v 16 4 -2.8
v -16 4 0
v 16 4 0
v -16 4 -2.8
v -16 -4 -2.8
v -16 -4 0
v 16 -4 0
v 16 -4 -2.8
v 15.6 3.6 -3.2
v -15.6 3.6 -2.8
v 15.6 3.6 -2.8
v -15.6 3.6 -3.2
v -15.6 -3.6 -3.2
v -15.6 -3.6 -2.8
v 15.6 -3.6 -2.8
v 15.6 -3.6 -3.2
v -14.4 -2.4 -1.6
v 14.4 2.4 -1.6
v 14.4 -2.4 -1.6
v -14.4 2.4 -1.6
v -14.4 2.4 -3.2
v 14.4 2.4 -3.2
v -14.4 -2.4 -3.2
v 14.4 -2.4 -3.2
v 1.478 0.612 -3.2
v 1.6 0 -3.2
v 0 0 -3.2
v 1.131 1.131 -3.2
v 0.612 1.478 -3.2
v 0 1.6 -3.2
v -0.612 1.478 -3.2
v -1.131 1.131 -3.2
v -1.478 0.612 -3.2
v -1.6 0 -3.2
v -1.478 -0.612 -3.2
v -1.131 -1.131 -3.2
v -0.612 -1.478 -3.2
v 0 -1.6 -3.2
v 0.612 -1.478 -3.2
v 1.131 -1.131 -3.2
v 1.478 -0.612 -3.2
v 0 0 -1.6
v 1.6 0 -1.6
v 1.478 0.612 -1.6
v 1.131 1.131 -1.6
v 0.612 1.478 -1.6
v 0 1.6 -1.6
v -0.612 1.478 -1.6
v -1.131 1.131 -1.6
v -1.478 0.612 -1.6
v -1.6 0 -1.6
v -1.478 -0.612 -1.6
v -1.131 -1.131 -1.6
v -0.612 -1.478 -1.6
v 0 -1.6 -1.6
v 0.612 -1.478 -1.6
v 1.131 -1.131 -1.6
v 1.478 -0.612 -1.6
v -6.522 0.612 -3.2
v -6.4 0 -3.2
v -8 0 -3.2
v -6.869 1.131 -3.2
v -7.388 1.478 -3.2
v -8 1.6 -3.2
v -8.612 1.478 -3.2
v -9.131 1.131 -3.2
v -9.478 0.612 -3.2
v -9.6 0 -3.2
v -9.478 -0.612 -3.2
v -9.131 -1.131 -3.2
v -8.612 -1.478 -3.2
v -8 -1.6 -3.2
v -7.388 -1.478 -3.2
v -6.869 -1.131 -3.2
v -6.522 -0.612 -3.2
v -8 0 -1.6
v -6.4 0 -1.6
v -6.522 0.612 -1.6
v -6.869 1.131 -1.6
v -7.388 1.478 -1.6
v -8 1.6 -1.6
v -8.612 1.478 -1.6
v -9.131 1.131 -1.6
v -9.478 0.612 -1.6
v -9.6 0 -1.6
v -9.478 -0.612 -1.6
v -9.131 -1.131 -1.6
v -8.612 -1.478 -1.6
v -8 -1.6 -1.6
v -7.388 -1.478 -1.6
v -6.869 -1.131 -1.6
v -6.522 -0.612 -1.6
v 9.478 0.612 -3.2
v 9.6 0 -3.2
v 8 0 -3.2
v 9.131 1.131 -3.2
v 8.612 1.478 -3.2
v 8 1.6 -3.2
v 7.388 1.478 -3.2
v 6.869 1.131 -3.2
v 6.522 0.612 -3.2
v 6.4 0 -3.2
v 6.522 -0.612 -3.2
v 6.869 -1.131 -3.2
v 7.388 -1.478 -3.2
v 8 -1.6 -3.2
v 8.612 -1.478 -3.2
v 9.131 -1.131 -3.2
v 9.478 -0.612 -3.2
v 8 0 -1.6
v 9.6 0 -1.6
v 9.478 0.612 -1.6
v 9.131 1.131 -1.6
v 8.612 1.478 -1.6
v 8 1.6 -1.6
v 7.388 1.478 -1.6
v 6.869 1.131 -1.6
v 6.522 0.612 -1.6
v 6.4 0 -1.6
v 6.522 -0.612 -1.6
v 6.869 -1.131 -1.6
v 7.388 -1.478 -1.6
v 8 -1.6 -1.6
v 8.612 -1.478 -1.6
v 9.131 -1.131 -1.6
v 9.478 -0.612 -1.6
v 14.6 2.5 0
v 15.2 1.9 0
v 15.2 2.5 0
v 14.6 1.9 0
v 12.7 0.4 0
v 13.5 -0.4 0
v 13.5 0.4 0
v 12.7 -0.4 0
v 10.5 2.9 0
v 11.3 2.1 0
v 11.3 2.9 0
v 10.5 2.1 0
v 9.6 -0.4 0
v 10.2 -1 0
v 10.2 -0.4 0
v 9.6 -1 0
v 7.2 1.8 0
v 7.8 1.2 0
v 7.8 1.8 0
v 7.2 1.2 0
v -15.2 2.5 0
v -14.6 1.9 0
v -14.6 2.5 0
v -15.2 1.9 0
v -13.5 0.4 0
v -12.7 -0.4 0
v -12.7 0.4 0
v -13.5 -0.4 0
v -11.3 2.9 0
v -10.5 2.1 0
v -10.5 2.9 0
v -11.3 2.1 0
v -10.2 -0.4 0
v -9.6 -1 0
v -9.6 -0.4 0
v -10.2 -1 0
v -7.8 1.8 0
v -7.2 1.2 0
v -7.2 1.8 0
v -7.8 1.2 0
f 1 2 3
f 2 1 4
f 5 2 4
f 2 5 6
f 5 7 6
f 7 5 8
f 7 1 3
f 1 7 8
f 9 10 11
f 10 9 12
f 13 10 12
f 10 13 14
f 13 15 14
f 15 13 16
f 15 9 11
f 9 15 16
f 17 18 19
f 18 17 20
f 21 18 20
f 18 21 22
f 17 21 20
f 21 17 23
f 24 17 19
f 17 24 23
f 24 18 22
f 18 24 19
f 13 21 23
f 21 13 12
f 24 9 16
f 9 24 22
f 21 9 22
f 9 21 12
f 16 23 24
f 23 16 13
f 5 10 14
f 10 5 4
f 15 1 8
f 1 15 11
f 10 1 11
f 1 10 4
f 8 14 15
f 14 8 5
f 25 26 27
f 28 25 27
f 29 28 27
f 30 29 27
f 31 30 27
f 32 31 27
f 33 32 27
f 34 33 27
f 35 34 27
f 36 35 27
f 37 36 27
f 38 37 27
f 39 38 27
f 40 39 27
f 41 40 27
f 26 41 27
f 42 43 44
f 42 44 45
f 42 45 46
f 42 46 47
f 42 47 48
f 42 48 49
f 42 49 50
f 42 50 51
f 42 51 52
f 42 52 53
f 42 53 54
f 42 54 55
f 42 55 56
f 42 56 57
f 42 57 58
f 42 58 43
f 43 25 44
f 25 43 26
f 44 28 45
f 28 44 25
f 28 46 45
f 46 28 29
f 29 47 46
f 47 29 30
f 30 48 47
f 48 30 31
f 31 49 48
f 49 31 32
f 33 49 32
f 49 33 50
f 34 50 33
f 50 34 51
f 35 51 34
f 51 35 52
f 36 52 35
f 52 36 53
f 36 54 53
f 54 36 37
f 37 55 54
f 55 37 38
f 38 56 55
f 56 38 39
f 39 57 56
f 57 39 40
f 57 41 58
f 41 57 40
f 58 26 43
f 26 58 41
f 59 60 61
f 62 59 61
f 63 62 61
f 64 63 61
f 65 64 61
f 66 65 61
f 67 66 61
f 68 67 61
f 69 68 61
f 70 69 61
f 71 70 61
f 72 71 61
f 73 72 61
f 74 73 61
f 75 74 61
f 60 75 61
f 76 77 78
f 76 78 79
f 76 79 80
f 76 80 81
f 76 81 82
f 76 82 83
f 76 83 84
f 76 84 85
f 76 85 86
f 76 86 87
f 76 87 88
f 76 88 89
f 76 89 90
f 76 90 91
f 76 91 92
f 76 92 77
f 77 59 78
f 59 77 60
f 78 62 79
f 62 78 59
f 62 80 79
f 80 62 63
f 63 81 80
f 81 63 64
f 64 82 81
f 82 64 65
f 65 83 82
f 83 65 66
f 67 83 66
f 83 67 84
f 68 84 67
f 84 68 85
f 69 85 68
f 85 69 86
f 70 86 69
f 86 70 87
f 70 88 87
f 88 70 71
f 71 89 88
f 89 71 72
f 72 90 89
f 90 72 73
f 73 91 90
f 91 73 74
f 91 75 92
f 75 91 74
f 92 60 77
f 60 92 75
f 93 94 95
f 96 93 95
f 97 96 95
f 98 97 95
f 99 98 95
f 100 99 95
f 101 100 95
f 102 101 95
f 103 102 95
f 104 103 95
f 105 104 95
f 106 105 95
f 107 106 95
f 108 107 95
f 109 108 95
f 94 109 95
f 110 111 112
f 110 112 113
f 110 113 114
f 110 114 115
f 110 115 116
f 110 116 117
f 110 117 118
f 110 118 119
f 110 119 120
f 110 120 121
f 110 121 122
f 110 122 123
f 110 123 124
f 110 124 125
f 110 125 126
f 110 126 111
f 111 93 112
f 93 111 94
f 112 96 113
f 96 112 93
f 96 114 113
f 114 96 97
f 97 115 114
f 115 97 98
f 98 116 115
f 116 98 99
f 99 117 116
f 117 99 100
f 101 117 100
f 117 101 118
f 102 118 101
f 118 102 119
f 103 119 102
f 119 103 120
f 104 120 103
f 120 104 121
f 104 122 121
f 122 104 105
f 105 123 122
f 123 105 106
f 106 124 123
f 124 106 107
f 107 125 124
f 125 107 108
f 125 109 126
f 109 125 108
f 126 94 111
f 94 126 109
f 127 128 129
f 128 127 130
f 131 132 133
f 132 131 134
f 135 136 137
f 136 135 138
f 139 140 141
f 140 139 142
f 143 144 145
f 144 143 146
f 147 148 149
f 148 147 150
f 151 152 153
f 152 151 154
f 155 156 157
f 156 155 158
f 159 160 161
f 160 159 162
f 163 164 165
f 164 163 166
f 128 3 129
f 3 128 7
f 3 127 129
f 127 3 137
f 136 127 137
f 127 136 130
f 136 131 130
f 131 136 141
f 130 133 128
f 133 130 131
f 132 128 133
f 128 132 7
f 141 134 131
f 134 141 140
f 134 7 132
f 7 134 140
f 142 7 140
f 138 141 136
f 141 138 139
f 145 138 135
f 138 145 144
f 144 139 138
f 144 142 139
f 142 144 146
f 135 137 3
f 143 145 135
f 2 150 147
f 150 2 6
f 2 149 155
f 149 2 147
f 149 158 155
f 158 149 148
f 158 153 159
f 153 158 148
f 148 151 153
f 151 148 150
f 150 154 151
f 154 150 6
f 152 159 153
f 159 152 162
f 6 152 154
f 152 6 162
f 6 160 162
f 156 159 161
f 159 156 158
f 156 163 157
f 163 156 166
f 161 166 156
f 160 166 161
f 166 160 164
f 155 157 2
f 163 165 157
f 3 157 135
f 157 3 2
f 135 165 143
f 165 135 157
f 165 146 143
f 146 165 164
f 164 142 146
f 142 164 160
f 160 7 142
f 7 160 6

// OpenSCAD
// file: ../p/4-4edge.scad
use <../lib.scad>
function ldraw_lib__4_4edge() = [
// 0 Circle 1.0
// 0 Name: 4-4edge.dat
// 0 Author: James Jessiman
// 0 !LDRAW_ORG Primitive UPDATE 2017-01
// 0 !LICENSE Licensed under CC BY 2.0 and CC BY 4.0 : see CAreadme.txt
// 
// 0 BFC CERTIFY CCW
  [0,"BFC","CERTIFY"],
  [0,"BFC","CCW"],
// 
// 0 !HISTORY 1998-12-15 [PTadmin] Official Update 1998-10
// 0 !HISTORY 2005-12-28 [PTadmin] Official Update 2005-01
// 0 !HISTORY 2007-06-24 [PTadmin] Header formatted for Contributor Agreement
// 0 !HISTORY 2008-07-01 [PTadmin] Official Update 2008-01
// 0 !HISTORY 2017-01-15 [Steffen] BFCed
// 0 !HISTORY 2017-12-30 [PTadmin] Official Update 2017-01
// 
// 
// 2 24 1 0 0 0.9239 0 0.3827
  [2,24,1,0,0,0.9239,0,0.3827],
// 2 24 0.9239 0 0.3827 0.7071 0 0.7071
  [2,24,0.9239,0,0.3827,0.7071,0,0.7071],
// 2 24 0.7071 0 0.7071 0.3827 0 0.9239
  [2,24,0.7071,0,0.7071,0.3827,0,0.9239],
// 2 24 0.3827 0 0.9239 0 0 1
  [2,24,0.3827,0,0.9239,0,0,1],
// 2 24 0 0 1 -0.3827 0 0.9239
  [2,24,0,0,1,-0.3827,0,0.9239],
// 2 24 -0.3827 0 0.9239 -0.7071 0 0.7071
  [2,24,-0.3827,0,0.9239,-0.7071,0,0.7071],
// 2 24 -0.7071 0 0.7071 -0.9239 0 0.3827
  [2,24,-0.7071,0,0.7071,-0.9239,0,0.3827],
// 2 24 -0.9239 0 0.3827 -1 0 -0
  [2,24,-0.9239,0,0.3827,-1,0,-0],
// 2 24 -1 0 -0 -0.9239 0 -0.3827
  [2,24,-1,0,-0,-0.9239,0,-0.3827],
// 2 24 -0.9239 0 -0.3827 -0.7071 0 -0.7071
  [2,24,-0.9239,0,-0.3827,-0.7071,0,-0.7071],
// 2 24 -0.7071 0 -0.7071 -0.3827 0 -0.9239
  [2,24,-0.7071,0,-0.7071,-0.3827,0,-0.9239],
// 2 24 -0.3827 0 -0.9239 0 0 -1
  [2,24,-0.3827,0,-0.9239,0,0,-1],
// 2 24 0 0 -1 0.3827 0 -0.9239
  [2,24,0,0,-1,0.3827,0,-0.9239],
// 2 24 0.3827 0 -0.9239 0.7071 0 -0.7071
  [2,24,0.3827,0,-0.9239,0.7071,0,-0.7071],
// 2 24 0.7071 0 -0.7071 0.9239 0 -0.3827
  [2,24,0.7071,0,-0.7071,0.9239,0,-0.3827],
// 2 24 0.9239 0 -0.3827 1 0 0
  [2,24,0.9239,0,-0.3827,1,0,0],
];
module ldraw_lib__4_4edge(step=0, col=false, unit=2/5, alt=false, line=0.2, solid=!$preview)
    makepoly(ldraw_lib__4_4edge(), step=step, col=col, unit=unit, alt=alt, line=line, solid=solid);
ldraw_lib__4_4edge(line=0.2);
// file: ../p/4-4disc.scad
use <../lib.scad>
function ldraw_lib__4_4disc() = [
// 0 Disc 1.0
// 0 Name: 4-4disc.dat
// 0 Author: James Jessiman
// 0 !LDRAW_ORG Primitive UPDATE 2002-02
// 0 !LICENSE Licensed under CC BY 2.0 and CC BY 4.0 : see CAreadme.txt
// 
// 0 BFC CERTIFY CCW
  [0,"BFC","CERTIFY"],
  [0,"BFC","CCW"],
// 
// 0 !HISTORY 1998-12-15 [PTadmin] Official Update 1998-10
// 0 !HISTORY 2002-03-23 [sbliss] Added BFC statement
// 0 !HISTORY 2002-04-25 [PTadmin] Official Update 2002-02
// 0 !HISTORY 2007-06-24 [PTadmin] Header formatted for Contributor Agreement
// 0 !HISTORY 2008-07-01 [PTadmin] Official Update 2008-01
// 
// 
// 3 16 0 0 0 1 0 0 0.9239 0 0.3827
  [3,16,0,0,0,1,0,0,0.9239,0,0.3827],
// 3 16 0 0 0 0.9239 0 0.3827 0.7071 0 0.7071
  [3,16,0,0,0,0.9239,0,0.3827,0.7071,0,0.7071],
// 3 16 0 0 0 0.7071 0 0.7071 0.3827 0 0.9239
  [3,16,0,0,0,0.7071,0,0.7071,0.3827,0,0.9239],
// 3 16 0 0 0 0.3827 0 0.9239 0 0 1
  [3,16,0,0,0,0.3827,0,0.9239,0,0,1],
// 3 16 0 0 0 0 0 1 -0.3827 0 0.9239
  [3,16,0,0,0,0,0,1,-0.3827,0,0.9239],
// 3 16 0 0 0 -0.3827 0 0.9239 -0.7071 0 0.7071
  [3,16,0,0,0,-0.3827,0,0.9239,-0.7071,0,0.7071],
// 3 16 0 0 0 -0.7071 0 0.7071 -0.9239 0 0.3827
  [3,16,0,0,0,-0.7071,0,0.7071,-0.9239,0,0.3827],
// 3 16 0 0 0 -0.9239 0 0.3827 -1 0 -0
  [3,16,0,0,0,-0.9239,0,0.3827,-1,0,-0],
// 3 16 0 0 0 -1 0 -0 -0.9239 0 -0.3827
  [3,16,0,0,0,-1,0,-0,-0.9239,0,-0.3827],
// 3 16 0 0 0 -0.9239 0 -0.3827 -0.7071 0 -0.7071
  [3,16,0,0,0,-0.9239,0,-0.3827,-0.7071,0,-0.7071],
// 3 16 0 0 0 -0.7071 0 -0.7071 -0.3827 0 -0.9239
  [3,16,0,0,0,-0.7071,0,-0.7071,-0.3827,0,-0.9239],
// 3 16 0 0 0 -0.3827 0 -0.9239 0 0 -1
  [3,16,0,0,0,-0.3827,0,-0.9239,0,0,-1],
// 3 16 0 0 0 0 0 -1 0.3827 0 -0.9239
  [3,16,0,0,0,0,0,-1,0.3827,0,-0.9239],
// 3 16 0 0 0 0.3827 0 -0.9239 0.7071 0 -0.7071
  [3,16,0,0,0,0.3827,0,-0.9239,0.7071,0,-0.7071],
// 3 16 0 0 0 0.7071 0 -0.7071 0.9239 0 -0.3827
  [3,16,0,0,0,0.7071,0,-0.7071,0.9239,0,-0.3827],
// 3 16 0 0 0 0.9239 0 -0.3827 1 0 0
  [3,16,0,0,0,0.9239,0,-0.3827,1,0,0],
// 0
];
module ldraw_lib__4_4disc(step=0, col=false, unit=2/5, alt=false, line=0.2, solid=!$preview)
    makepoly(ldraw_lib__4_4disc(), step=step, col=col, unit=unit, alt=alt, line=line, solid=solid);
ldraw_lib__4_4disc(line=0.2);
// file: ../p/4-4cyli.scad
use <../lib.scad>
$fa=1; $fs=0.2;
function ldraw_lib__4_4cyli(realsolid=false) = [
// 0 Cylinder 1.0
// 0 Name: 4-4cyli.dat
// 0 Author: James Jessiman
// 0 !LDRAW_ORG Primitive UPDATE 2005-01
// 0 !LICENSE Licensed under CC BY 2.0 and CC BY 4.0 : see CAreadme.txt
// 
// 0 BFC CERTIFY CCW
  [0,"BFC","CERTIFY"],
  [0,"BFC","CCW"],
// 
// 0 !HISTORY 1998-12-15 [PTadmin] Official Update 1998-10
// 0 !HISTORY 2002-03-23 [sbliss] Added BFC statement; merged headers from files in distributions LDraw 0.27 and Complete.
// 0 !HISTORY 2002-04-25 [PTadmin] Official Update 2002-02
// 0 !HISTORY 2004-12-14 [guyvivan] BFC CCW
// 0 !HISTORY 2005-12-28 [PTadmin] Official Update 2005-01
// 0 !HISTORY 2007-06-24 [PTadmin] Header formatted for Contributor Agreement
// 0 !HISTORY 2008-07-01 [PTadmin] Official Update 2008-01
// 
// 
// 4 16 1 1 0 0.9239 1 0.3827 0.9239 0 0.3827 1 0 0
  [4,16,1,1,0,0.9239,1,0.3827,0.9239,0,0.3827,1,0,0],
// 5 24 1 0 0 1 1 0 0.9239 0 0.3827 0.9239 0 -0.3827
  [5,24,1,0,0,1,1,0,0.9239,0,0.3827,0.9239,0,-0.3827],
// 4 16 0.9239 1 0.3827 0.7071 1 0.7071 0.7071 0 0.7071 0.9239 0 0.3827
  [4,16,0.9239,1,0.3827,0.7071,1,0.7071,0.7071,0,0.7071,0.9239,0,0.3827],
// 5 24 0.9239 0 0.3827 0.9239 1 0.3827 0.7071 0 0.7071 1 0 0
  [5,24,0.9239,0,0.3827,0.9239,1,0.3827,0.7071,0,0.7071,1,0,0],
// 4 16 0.7071 1 0.7071 0.3827 1 0.9239 0.3827 0 0.9239 0.7071 0 0.7071
  [4,16,0.7071,1,0.7071,0.3827,1,0.9239,0.3827,0,0.9239,0.7071,0,0.7071],
// 5 24 0.7071 0 0.7071 0.7071 1 0.7071 0.3827 0 0.9239 0.9239 0 0.3827
  [5,24,0.7071,0,0.7071,0.7071,1,0.7071,0.3827,0,0.9239,0.9239,0,0.3827],
// 4 16 0.3827 1 0.9239 0 1 1 0 0 1 0.3827 0 0.9239
  [4,16,0.3827,1,0.9239,0,1,1,0,0,1,0.3827,0,0.9239],
// 5 24 0.3827 0 0.9239 0.3827 1 0.9239 0 0 1 0.7071 0 0.7071
  [5,24,0.3827,0,0.9239,0.3827,1,0.9239,0,0,1,0.7071,0,0.7071],
// 4 16 0 1 1 -0.3827 1 0.9239 -0.3827 0 0.9239 0 0 1
  [4,16,0,1,1,-0.3827,1,0.9239,-0.3827,0,0.9239,0,0,1],
// 5 24 0 0 1 0 1 1 -0.3827 0 0.9239 0.3827 0 0.9239
  [5,24,0,0,1,0,1,1,-0.3827,0,0.9239,0.3827,0,0.9239],
// 4 16 -0.3827 1 0.9239 -0.7071 1 0.7071 -0.7071 0 0.7071 -0.3827 0 0.9239
  [4,16,-0.3827,1,0.9239,-0.7071,1,0.7071,-0.7071,0,0.7071,-0.3827,0,0.9239],
// 5 24 -0.3827 0 0.9239 -0.3827 1 0.9239 -0.7071 0 0.7071 0 0 1
  [5,24,-0.3827,0,0.9239,-0.3827,1,0.9239,-0.7071,0,0.7071,0,0,1],
// 4 16 -0.7071 1 0.7071 -0.9239 1 0.3827 -0.9239 0 0.3827 -0.7071 0 0.7071
  [4,16,-0.7071,1,0.7071,-0.9239,1,0.3827,-0.9239,0,0.3827,-0.7071,0,0.7071],
// 5 24 -0.7071 0 0.7071 -0.7071 1 0.7071 -0.9239 0 0.3827 -0.3827 0 0.9239
  [5,24,-0.7071,0,0.7071,-0.7071,1,0.7071,-0.9239,0,0.3827,-0.3827,0,0.9239],
// 4 16 -0.9239 1 0.3827 -1 1 0 -1 0 0 -0.9239 0 0.3827
  [4,16,-0.9239,1,0.3827,-1,1,0,-1,0,0,-0.9239,0,0.3827],
// 5 24 -0.9239 0 0.3827 -0.9239 1 0.3827 -1 0 0 -0.7071 0 0.7071
  [5,24,-0.9239,0,0.3827,-0.9239,1,0.3827,-1,0,0,-0.7071,0,0.7071],
// 4 16 -1 1 0 -0.9239 1 -0.3827 -0.9239 0 -0.3827 -1 0 0
  [4,16,-1,1,0,-0.9239,1,-0.3827,-0.9239,0,-0.3827,-1,0,0],
// 5 24 -1 0 0 -1 1 0 -0.9239 0 -0.3827 -0.9239 0 0.3827
  [5,24,-1,0,0,-1,1,0,-0.9239,0,-0.3827,-0.9239,0,0.3827],
// 4 16 -0.9239 1 -0.3827 -0.7071 1 -0.7071 -0.7071 0 -0.7071 -0.9239 0 -0.3827
  [4,16,-0.9239,1,-0.3827,-0.7071,1,-0.7071,-0.7071,0,-0.7071,-0.9239,0,-0.3827],
// 5 24 -0.9239 0 -0.3827 -0.9239 1 -0.3827 -0.7071 0 -0.7071 -1 0 0
  [5,24,-0.9239,0,-0.3827,-0.9239,1,-0.3827,-0.7071,0,-0.7071,-1,0,0],
// 4 16 -0.7071 1 -0.7071 -0.3827 1 -0.9239 -0.3827 0 -0.9239 -0.7071 0 -0.7071
  [4,16,-0.7071,1,-0.7071,-0.3827,1,-0.9239,-0.3827,0,-0.9239,-0.7071,0,-0.7071],
// 5 24 -0.7071 0 -0.7071 -0.7071 1 -0.7071 -0.3827 0 -0.9239 -0.9239 0 -0.3827
  [5,24,-0.7071,0,-0.7071,-0.7071,1,-0.7071,-0.3827,0,-0.9239,-0.9239,0,-0.3827],
// 4 16 -0.3827 1 -0.9239 0 1 -1 0 0 -1 -0.3827 0 -0.9239
  [4,16,-0.3827,1,-0.9239,0,1,-1,0,0,-1,-0.3827,0,-0.9239],
// 5 24 -0.3827 0 -0.9239 -0.3827 1 -0.9239 0 0 -1 -0.7071 0 -0.7071
  [5,24,-0.3827,0,-0.9239,-0.3827,1,-0.9239,0,0,-1,-0.7071,0,-0.7071],
// 4 16 0 1 -1 0.3827 1 -0.9239 0.3827 0 -0.9239 0 0 -1
  [4,16,0,1,-1,0.3827,1,-0.9239,0.3827,0,-0.9239,0,0,-1],
// 5 24 0 0 -1 0 1 -1 0.3827 0 -0.9239 -0.3827 0 -0.9239
  [5,24,0,0,-1,0,1,-1,0.3827,0,-0.9239,-0.3827,0,-0.9239],
// 4 16 0.3827 1 -0.9239 0.7071 1 -0.7071 0.7071 0 -0.7071 0.3827 0 -0.9239
  [4,16,0.3827,1,-0.9239,0.7071,1,-0.7071,0.7071,0,-0.7071,0.3827,0,-0.9239],
// 5 24 0.3827 0 -0.9239 0.3827 1 -0.9239 0.7071 0 -0.7071 0 0 -1
  [5,24,0.3827,0,-0.9239,0.3827,1,-0.9239,0.7071,0,-0.7071,0,0,-1],
// 4 16 0.7071 1 -0.7071 0.9239 1 -0.3827 0.9239 0 -0.3827 0.7071 0 -0.7071
  [4,16,0.7071,1,-0.7071,0.9239,1,-0.3827,0.9239,0,-0.3827,0.7071,0,-0.7071],
// 5 24 0.7071 0 -0.7071 0.7071 1 -0.7071 0.9239 0 -0.3827 0.3827 0 -0.9239
  [5,24,0.7071,0,-0.7071,0.7071,1,-0.7071,0.9239,0,-0.3827,0.3827,0,-0.9239],
// 4 16 0.9239 1 -0.3827 1 1 0 1 0 0 0.9239 0 -0.3827
  [4,16,0.9239,1,-0.3827,1,1,0,1,0,0,0.9239,0,-0.3827],
// 5 24 0.9239 0 -0.3827 0.9239 1 -0.3827 1 0 0 0.7071 0 -0.7071
  [5,24,0.9239,0,-0.3827,0.9239,1,-0.3827,1,0,0,0.7071,0,-0.7071],
// 0
];
module ldraw_lib__4_4cyli(step=0, col=false, unit=2/5, alt=false, line=0.2, solid=!$preview)
    makepoly(ldraw_lib__4_4cyli(solid), step=step, col=col, unit=unit, alt=alt, line=line, solid=solid);
ldraw_lib__4_4cyli(line=0.2);
// file: ../p/stud3.scad
use <../lib.scad>
use <4-4cyli.scad>
use <4-4disc.scad>
use <4-4edge.scad>
function ldraw_lib__stud3() = [
// 0 Stud Tube Solid
// 0 Name: stud3.dat
// 0 Author: James Jessiman
// 0 !LDRAW_ORG Primitive UPDATE 2012-01
// 0 !LICENSE Licensed under CC BY 4.0 : see CAreadme.txt
// 
// 0 BFC CERTIFY CCW
  [0,"BFC","CERTIFY"],
  [0,"BFC","CCW"],
// 
// 0 !HISTORY 2002-04-04 [sbliss] Modified for BFC compliance
// 0 !HISTORY 2002-04-25 [PTadmin] Official Update 2002-02
// 0 !HISTORY 2007-06-24 [PTadmin] Header formatted for Contributor Agreement
// 0 !HISTORY 2008-07-01 [PTadmin] Official Update 2008-01
// 0 !HISTORY 2012-02-16 [Philo] Changed to CCW
// 0 !HISTORY 2012-03-30 [PTadmin] Official Update 2012-01
// 
// 
// 1 16 0 -4 0 4 0 0 0 1 0 0 0 4 4-4edge.dat
  [1,16,0,-4,0,4,0,0,0,1,0,0,0,4, ldraw_lib__4_4edge()],
// 1 16 0 0 0 4 0 0 0 1 0 0 0 4 4-4edge.dat
  [1,16,0,0,0,4,0,0,0,1,0,0,0,4, ldraw_lib__4_4edge()],
// 1 16 0 -4 0 4 0 0 0 1 0 0 0 4 4-4disc.dat
  [1,16,0,-4,0,4,0,0,0,1,0,0,0,4, ldraw_lib__4_4disc()],
  [-1,16,0,0,0,4,0,0,0,-1,0,0,0,4, ldraw_lib__4_4disc()],
// 1 16 0 -4 0 4 0 0 0 4 0 0 0 4 4-4cyli.dat
  [1,16,0,-4,0,4,0,0,0,4,0,0,0,4, ldraw_lib__4_4cyli()],
];
module ldraw_lib__stud3(step=0, col=false, unit=2/5, alt=false, line=0.2, solid=!$preview)
    makepoly(ldraw_lib__stud3(), step=step, col=col, unit=unit, alt=alt, line=line, solid=solid);
ldraw_lib__stud3(line=0.2);
// file: ../p/box5.scad
use <../lib.scad>
function ldraw_lib__box5() = [
// 0 Box with 5 Faces and All Edges
// 0 Name: box5.dat
// 0 Author: James Jessiman
// 0 !LDRAW_ORG Primitive UPDATE 2012-01
// 0 !LICENSE Licensed under CC BY 2.0 and CC BY 4.0 : see CAreadme.txt
// 
// 0 BFC CERTIFY CCW
  [0,"BFC","CERTIFY"],
  [0,"BFC","CCW"],
// 
// 0 !HISTORY 2002-04-03 [sbliss] Modified for BFC compliance
// 0 !HISTORY 2002-04-25 [PTadmin] Official Update 2002-02
// 0 !HISTORY 2007-06-24 [PTadmin] Header formatted for Contributor Agreement
// 0 !HISTORY 2008-07-01 [PTadmin] Official Update 2008-01
// 0 !HISTORY 2012-02-16 [Philo] Changed to CCW
// 0 !HISTORY 2012-03-30 [PTadmin] Official Update 2012-01
// 
// 
// 2 24 1 1 1 -1 1 1
  [2,24,1,1,1,-1,1,1],
// 2 24 -1 1 1 -1 1 -1
  [2,24,-1,1,1,-1,1,-1],
// 2 24 -1 1 -1 1 1 -1
  [2,24,-1,1,-1,1,1,-1],
// 2 24 1 1 -1 1 1 1
  [2,24,1,1,-1,1,1,1],
// 2 24 1 0 1 -1 0 1
  [2,24,1,0,1,-1,0,1],
// 2 24 -1 0 1 -1 0 -1
  [2,24,-1,0,1,-1,0,-1],
// 2 24 -1 0 -1 1 0 -1
  [2,24,-1,0,-1,1,0,-1],
// 2 24 1 0 -1 1 0 1
  [2,24,1,0,-1,1,0,1],
// 2 24 1 0 1 1 1 1
  [2,24,1,0,1,1,1,1],
// 2 24 -1 0 1 -1 1 1
  [2,24,-1,0,1,-1,1,1],
// 2 24 1 0 -1 1 1 -1
  [2,24,1,0,-1,1,1,-1],
// 2 24 -1 0 -1 -1 1 -1
  [2,24,-1,0,-1,-1,1,-1],
// 4 16 -1 1 1 1 1 1 1 1 -1 -1 1 -1
  [4,16,-1,1,1,1,1,1,1,1,-1,-1,1,-1],
// 4 16 -1 1 1 -1 0 1 1 0 1 1 1 1
  [4,16,-1,1,1,-1,0,1,1,0,1,1,1,1],
// 4 16 -1 1 -1 -1 0 -1 -1 0 1 -1 1 1
  [4,16,-1,1,-1,-1,0,-1,-1,0,1,-1,1,1],
// 4 16 1 1 -1 1 0 -1 -1 0 -1 -1 1 -1
  [4,16,1,1,-1,1,0,-1,-1,0,-1,-1,1,-1],
// 4 16 1 1 1 1 0 1 1 0 -1 1 1 -1
  [4,16,1,1,1,1,0,1,1,0,-1,1,1,-1],
];
makepoly(ldraw_lib__box5(), line=0.2);
// file: ../p/box4.scad
use <../lib.scad>
function ldraw_lib__box4() = [
// 0 Box with 4 Faces (2 Parallel Pairs) and All Edges
// 0 Name: box4.dat
// 0 Author: James Jessiman
// 0 !LDRAW_ORG Primitive UPDATE 2012-01
// 0 !LICENSE Licensed under CC BY 4.0 : see CAreadme.txt
// 
// 0 BFC CERTIFY CCW
  [0,"BFC","CERTIFY"],
  [0,"BFC","CCW"],
// 
// 0 !HISTORY 2002-04-03 [sbliss] Modified for BFC compliance
// 0 !HISTORY 2002-04-25 [PTadmin] Official Update 2002-02
// 0 !HISTORY 2007-06-24 [PTadmin] Header formatted for Contributor Agreement
// 0 !HISTORY 2008-07-01 [PTadmin] Official Update 2008-01
// 0 !HISTORY 2012-02-16 [Philo] Changed to CCW
// 0 !HISTORY 2012-03-30 [PTadmin] Official Update 2012-01
// 
// 
// 2 24 1 1 1 -1 1 1
  [2,24,1,1,1,-1,1,1],
// 2 24 -1 1 1 -1 1 -1
  [2,24,-1,1,1,-1,1,-1],
// 2 24 -1 1 -1 1 1 -1
  [2,24,-1,1,-1,1,1,-1],
// 2 24 1 1 -1 1 1 1
  [2,24,1,1,-1,1,1,1],
// 2 24 1 0 1 -1 0 1
  [2,24,1,0,1,-1,0,1],
// 2 24 -1 0 1 -1 0 -1
  [2,24,-1,0,1,-1,0,-1],
// 2 24 -1 0 -1 1 0 -1
  [2,24,-1,0,-1,1,0,-1],
// 2 24 1 0 -1 1 0 1
  [2,24,1,0,-1,1,0,1],
// 2 24 1 0 1 1 1 1
  [2,24,1,0,1,1,1,1],
// 2 24 -1 0 1 -1 1 1
  [2,24,-1,0,1,-1,1,1],
// 2 24 1 0 -1 1 1 -1
  [2,24,1,0,-1,1,1,-1],
// 2 24 -1 0 -1 -1 1 -1
  [2,24,-1,0,-1,-1,1,-1],
// 4 16 -1 1 1 -1 0 1 1 0 1 1 1 1
  [4,16,-1,1,1,-1,0,1,1,0,1,1,1,1],
// 4 16 -1 1 -1 -1 0 -1 -1 0 1 -1 1 1
  [4,16,-1,1,-1,-1,0,-1,-1,0,1,-1,1,1],
// 4 16 1 1 -1 1 0 -1 -1 0 -1 -1 1 -1
  [4,16,1,1,-1,1,0,-1,-1,0,-1,-1,1,-1],
// 4 16 1 1 1 1 0 1 1 0 -1 1 1 -1
  [4,16,1,1,1,1,0,1,1,0,-1,1,1,-1],
];
module ldraw_lib__box4(step=0, col=false, unit=2/5, alt=false, line=0.2, solid=!$preview)
    makepoly(ldraw_lib__box4(), step=step, col=col, unit=unit, alt=alt, line=line, solid=solid);
ldraw_lib__box4(line=0.2);
// file: s/2431s01.scad
use <../../lib.scad>
use <../../p/box4.scad>
use <../../p/box5.scad>
use <../../p/stud3.scad>
function ldraw_lib__s__2431s01() = [
// 0 ~Tile  1 x  4 with Groove without Top Face
// 0 Name: s\2431s01.dat
// 0 Author: Santeri Piippo [arezey]
// 0 !LDRAW_ORG Subpart UPDATE 2010-02
// 0 !LICENSE Licensed under CC BY 2.0 and CC BY 4.0 : see CAreadme.txt
// 
// 0 BFC CERTIFY CCW
  [0,"BFC","CERTIFY"],
  [0,"BFC","CCW"],
// 
// 0 !HISTORY 2010-07-05 [PTadmin] Official Update 2010-02
// 
// 
// 1 16 0 0 0 40 0 0 0 7 0 0 0 10 box4.dat
  [1,16,0,0,0,40,0,0,0,7,0,0,0,10, ldraw_lib__box4()],
// 1 16 0 7 0 39 0 0 0 1 0 0 0 9 box4.dat
  [1,16,0,7,0,39,0,0,0,1,0,0,0,9, ldraw_lib__box4()],
// 0 BFC INVERTNEXT
  [0,"BFC","INVERTNEXT"],
// 1 16 0 8 0 36 0 0 0 -4 0 0 0 6 box5.dat
  [1,16,0,8,0,36,0,0,0,-4,0,0,0,6, ldraw_lib__box5()],
// 4 16 -39 8 9 -36 8 6 -36 8 -6 -39 8 -9
  [4,16,-39,8,9,-36,8,6,-36,8,-6,-39,8,-9],
// 4 16 39 8 -9 36 8 -6 36 8 6 39 8 9
  [4,16,39,8,-9,36,8,-6,36,8,6,39,8,9],
// 4 16 39 8 9 36 8 6 -36 8 6 -39 8 9
  [4,16,39,8,9,36,8,6,-36,8,6,-39,8,9],
// 4 16 -39 8 -9 -36 8 -6 36 8 -6 39 8 -9
  [4,16,-39,8,-9,-36,8,-6,36,8,-6,39,8,-9],
// 4 16 -40 7 10 -39 7 9 -39 7 -9 -40 7 -10
  [4,16,-40,7,10,-39,7,9,-39,7,-9,-40,7,-10],
// 4 16 40 7 -10 39 7 -9 39 7 9 40 7 10
  [4,16,40,7,-10,39,7,-9,39,7,9,40,7,10],
// 4 16 40 7 10 39 7 9 -39 7 9 -40 7 10
  [4,16,40,7,10,39,7,9,-39,7,9,-40,7,10],
// 4 16 -40 7 -10 -39 7 -9 39 7 -9 40 7 -10
  [4,16,-40,7,-10,-39,7,-9,39,7,-9,40,7,-10],
// 1 16 0 4 0 1 0 0 0 -1 0 0 0 1 stud3.dat
  [1,16,0,4,0,1,0,0,0,-1,0,0,0,1, ldraw_lib__stud3()],
// 1 16 -20 4 0 1 0 0 0 -1 0 0 0 1 stud3.dat
  [1,16,-20,4,0,1,0,0,0,-1,0,0,0,1, ldraw_lib__stud3()],
// 1 16 20 4 0 1 0 0 0 -1 0 0 0 1 stud3.dat
  [1,16,20,4,0,1,0,0,0,-1,0,0,0,1, ldraw_lib__stud3()],
// 0 //
];
makepoly(ldraw_lib__s__2431s01(), line=0.2);
// main file
use <../lib.scad>
use <s/2431s01.scad>
function ldraw_lib__2431pzd() = [
// 0 Tile  1 x  4 with 10 Medium Nougat Squares Pattern
// 0 Name: 2431pzd.dat
// 0 Author: Vincent Messenet [Cheenzo]
// 0 !LDRAW_ORG Part UPDATE 2020-01
// 0 !LICENSE Licensed under CC BY 4.0 : see CAreadme.txt
// 
// 0 BFC CERTIFY CCW
  [0,"BFC","CERTIFY"],
  [0,"BFC","CCW"],
// 
// 0 !KEYWORDS Anna, Brickheadz, BrickLink 2431pb528, Freckles, Frozen
// 0 !KEYWORDS Rebrickable 2431pr0130, Set 41618
// 
// 0 !HISTORY 2019-06-28 [PTadmin] Official Update 2019-01
// 0 !HISTORY 2020-05-10 [cwdee] Update colour name in description
// 0 !HISTORY 2020-06-28 [PTadmin] Official Update 2020-01
// 
// 
// 1 16 0 0 0 1 0 0 0 1 0 0 0 1 s\2431s01.dat
  [1,16,0,0,0,1,0,0,0,1,0,0,0,1, ldraw_lib__s__2431s01()],
// 
// 4 84 36.5 0 6.25 36.5 0 4.75 38 0 4.75 38 0 6.25
  [4,84,36.5,0,6.25,36.5,0,4.75,38,0,4.75,38,0,6.25],
// 4 84 31.75 0 1 31.75 0 -1 33.75 0 -1 33.75 0 1
  [4,84,31.75,0,1,31.75,0,-1,33.75,0,-1,33.75,0,1],
// 4 84 26.25 0 7.25 26.25 0 5.25 28.25 0 5.25 28.25 0 7.25
  [4,84,26.25,0,7.25,26.25,0,5.25,28.25,0,5.25,28.25,0,7.25],
// 4 84 24 0 -1 24 0 -2.5 25.5 0 -2.5 25.5 0 -1
  [4,84,24,0,-1,24,0,-2.5,25.5,0,-2.5,25.5,0,-1],
// 4 84 18 0 4.5 18 0 3 19.5 0 3 19.5 0 4.5
  [4,84,18,0,4.5,18,0,3,19.5,0,3,19.5,0,4.5],
// 
// 4 84 -38 0 4.75 -36.5 0 4.75 -36.5 0 6.25 -38 0 6.25
  [4,84,-38,0,4.75,-36.5,0,4.75,-36.5,0,6.25,-38,0,6.25],
// 4 84 -33.75 0 -1 -31.75 0 -1 -31.75 0 1 -33.75 0 1
  [4,84,-33.75,0,-1,-31.75,0,-1,-31.75,0,1,-33.75,0,1],
// 4 84 -28.25 0 5.25 -26.25 0 5.25 -26.25 0 7.25 -28.25 0 7.25
  [4,84,-28.25,0,5.25,-26.25,0,5.25,-26.25,0,7.25,-28.25,0,7.25],
// 4 84 -25.5 0 -2.5 -24 0 -2.5 -24 0 -1 -25.5 0 -1
  [4,84,-25.5,0,-2.5,-24,0,-2.5,-24,0,-1,-25.5,0,-1],
// 4 84 -19.5 0 3 -18 0 3 -18 0 4.5 -19.5 0 4.5
  [4,84,-19.5,0,3,-18,0,3,-18,0,4.5,-19.5,0,4.5],
// 
// 4 16 38 0 6.25 38 0 4.75 40 0 -10 40 0 10
  [4,16,38,0,6.25,38,0,4.75,40,0,-10,40,0,10],
// 4 16 28.25 0 7.25 36.5 0 6.25 38 0 6.25 40 0 10
  [4,16,28.25,0,7.25,36.5,0,6.25,38,0,6.25,40,0,10],
// 4 16 28.25 0 7.25 28.25 0 5.25 36.5 0 4.75 36.5 0 6.25
  [4,16,28.25,0,7.25,28.25,0,5.25,36.5,0,4.75,36.5,0,6.25],
// 4 16 28.25 0 5.25 25.5 0 -1 31.75 0 1 36.5 0 4.75
  [4,16,28.25,0,5.25,25.5,0,-1,31.75,0,1,36.5,0,4.75],
// 4 16 31.75 0 1 33.75 0 1 38 0 4.75 36.5 0 4.75
  [4,16,31.75,0,1,33.75,0,1,38,0,4.75,36.5,0,4.75],
// 4 16 33.75 0 1 33.75 0 -1 40 0 -10 38 0 4.75
  [4,16,33.75,0,1,33.75,0,-1,40,0,-10,38,0,4.75],
// 4 16 25.5 0 -1 25.5 0 -2.5 31.75 0 -1 31.75 0 1
  [4,16,25.5,0,-1,25.5,0,-2.5,31.75,0,-1,31.75,0,1],
// 4 16 25.5 0 -2.5 40 0 -10 33.75 0 -1 31.75 0 -1
  [4,16,25.5,0,-2.5,40,0,-10,33.75,0,-1,31.75,0,-1],
// 3 16 24 0 -2.5 40 0 -10 25.5 0 -2.5
  [3,16,24,0,-2.5,40,0,-10,25.5,0,-2.5],
// 4 16 24 0 -1 25.5 0 -1 28.25 0 5.25 26.25 0 5.25
  [4,16,24,0,-1,25.5,0,-1,28.25,0,5.25,26.25,0,5.25],
// 4 16 19.5 0 4.5 19.5 0 3 26.25 0 5.25 26.25 0 7.25
  [4,16,19.5,0,4.5,19.5,0,3,26.25,0,5.25,26.25,0,7.25],
// 3 16 19.5 0 3 24 0 -1 26.25 0 5.25
  [3,16,19.5,0,3,24,0,-1,26.25,0,5.25],
// 4 16 18 0 3 24 0 -2.5 24 0 -1 19.5 0 3
  [4,16,18,0,3,24,0,-2.5,24,0,-1,19.5,0,3],
// 3 16 26.25 0 7.25 28.25 0 7.25 40 0 10
  [3,16,26.25,0,7.25,28.25,0,7.25,40,0,10],
// 3 16 18 0 4.5 19.5 0 4.5 26.25 0 7.25
  [3,16,18,0,4.5,19.5,0,4.5,26.25,0,7.25],
// 
// 4 16 -40 0 -10 -38 0 4.75 -38 0 6.25 -40 0 10
  [4,16,-40,0,-10,-38,0,4.75,-38,0,6.25,-40,0,10],
// 4 16 -38 0 6.25 -36.5 0 6.25 -28.25 0 7.25 -40 0 10
  [4,16,-38,0,6.25,-36.5,0,6.25,-28.25,0,7.25,-40,0,10],
// 4 16 -36.5 0 4.75 -28.25 0 5.25 -28.25 0 7.25 -36.5 0 6.25
  [4,16,-36.5,0,4.75,-28.25,0,5.25,-28.25,0,7.25,-36.5,0,6.25],
// 4 16 -31.75 0 1 -25.5 0 -1 -28.25 0 5.25 -36.5 0 4.75
  [4,16,-31.75,0,1,-25.5,0,-1,-28.25,0,5.25,-36.5,0,4.75],
// 4 16 -38 0 4.75 -33.75 0 1 -31.75 0 1 -36.5 0 4.75
  [4,16,-38,0,4.75,-33.75,0,1,-31.75,0,1,-36.5,0,4.75],
// 4 16 -40 0 -10 -33.75 0 -1 -33.75 0 1 -38 0 4.75
  [4,16,-40,0,-10,-33.75,0,-1,-33.75,0,1,-38,0,4.75],
// 4 16 -31.75 0 -1 -25.5 0 -2.5 -25.5 0 -1 -31.75 0 1
  [4,16,-31.75,0,-1,-25.5,0,-2.5,-25.5,0,-1,-31.75,0,1],
// 4 16 -33.75 0 -1 -40 0 -10 -25.5 0 -2.5 -31.75 0 -1
  [4,16,-33.75,0,-1,-40,0,-10,-25.5,0,-2.5,-31.75,0,-1],
// 3 16 -40 0 -10 -24 0 -2.5 -25.5 0 -2.5
  [3,16,-40,0,-10,-24,0,-2.5,-25.5,0,-2.5],
// 4 16 -28.25 0 5.25 -25.5 0 -1 -24 0 -1 -26.25 0 5.25
  [4,16,-28.25,0,5.25,-25.5,0,-1,-24,0,-1,-26.25,0,5.25],
// 4 16 -26.25 0 5.25 -19.5 0 3 -19.5 0 4.5 -26.25 0 7.25
  [4,16,-26.25,0,5.25,-19.5,0,3,-19.5,0,4.5,-26.25,0,7.25],
// 3 16 -24 0 -1 -19.5 0 3 -26.25 0 5.25
  [3,16,-24,0,-1,-19.5,0,3,-26.25,0,5.25],
// 4 16 -24 0 -1 -24 0 -2.5 -18 0 3 -19.5 0 3
  [4,16,-24,0,-1,-24,0,-2.5,-18,0,3,-19.5,0,3],
// 3 16 -28.25 0 7.25 -26.25 0 7.25 -40 0 10
  [3,16,-28.25,0,7.25,-26.25,0,7.25,-40,0,10],
// 3 16 -19.5 0 4.5 -18 0 4.5 -26.25 0 7.25
  [3,16,-19.5,0,4.5,-18,0,4.5,-26.25,0,7.25],
// 
// 4 16 -40 0 10 -26.25 0 7.25 26.25 0 7.25 40 0 10
  [4,16,-40,0,10,-26.25,0,7.25,26.25,0,7.25,40,0,10],
// 4 16 -26.25 0 7.25 -18 0 4.5 18 0 4.5 26.25 0 7.25
  [4,16,-26.25,0,7.25,-18,0,4.5,18,0,4.5,26.25,0,7.25],
// 4 16 -18 0 4.5 -18 0 3 18 0 3 18 0 4.5
  [4,16,-18,0,4.5,-18,0,3,18,0,3,18,0,4.5],
// 4 16 -24 0 -2.5 24 0 -2.5 18 0 3 -18 0 3
  [4,16,-24,0,-2.5,24,0,-2.5,18,0,3,-18,0,3],
// 4 16 -40 0 -10 40 0 -10 24 0 -2.5 -24 0 -2.5
  [4,16,-40,0,-10,40,0,-10,24,0,-2.5,-24,0,-2.5],
];
module ldraw_lib__2431pzd(step=0, col=false, unit=2/5, alt=false, line=0.2, solid=!$preview)
    makepoly(ldraw_lib__2431pzd(), step=step, col=col, unit=unit, alt=alt, line=line, solid=solid);
ldraw_lib__2431pzd(line=0.2);
